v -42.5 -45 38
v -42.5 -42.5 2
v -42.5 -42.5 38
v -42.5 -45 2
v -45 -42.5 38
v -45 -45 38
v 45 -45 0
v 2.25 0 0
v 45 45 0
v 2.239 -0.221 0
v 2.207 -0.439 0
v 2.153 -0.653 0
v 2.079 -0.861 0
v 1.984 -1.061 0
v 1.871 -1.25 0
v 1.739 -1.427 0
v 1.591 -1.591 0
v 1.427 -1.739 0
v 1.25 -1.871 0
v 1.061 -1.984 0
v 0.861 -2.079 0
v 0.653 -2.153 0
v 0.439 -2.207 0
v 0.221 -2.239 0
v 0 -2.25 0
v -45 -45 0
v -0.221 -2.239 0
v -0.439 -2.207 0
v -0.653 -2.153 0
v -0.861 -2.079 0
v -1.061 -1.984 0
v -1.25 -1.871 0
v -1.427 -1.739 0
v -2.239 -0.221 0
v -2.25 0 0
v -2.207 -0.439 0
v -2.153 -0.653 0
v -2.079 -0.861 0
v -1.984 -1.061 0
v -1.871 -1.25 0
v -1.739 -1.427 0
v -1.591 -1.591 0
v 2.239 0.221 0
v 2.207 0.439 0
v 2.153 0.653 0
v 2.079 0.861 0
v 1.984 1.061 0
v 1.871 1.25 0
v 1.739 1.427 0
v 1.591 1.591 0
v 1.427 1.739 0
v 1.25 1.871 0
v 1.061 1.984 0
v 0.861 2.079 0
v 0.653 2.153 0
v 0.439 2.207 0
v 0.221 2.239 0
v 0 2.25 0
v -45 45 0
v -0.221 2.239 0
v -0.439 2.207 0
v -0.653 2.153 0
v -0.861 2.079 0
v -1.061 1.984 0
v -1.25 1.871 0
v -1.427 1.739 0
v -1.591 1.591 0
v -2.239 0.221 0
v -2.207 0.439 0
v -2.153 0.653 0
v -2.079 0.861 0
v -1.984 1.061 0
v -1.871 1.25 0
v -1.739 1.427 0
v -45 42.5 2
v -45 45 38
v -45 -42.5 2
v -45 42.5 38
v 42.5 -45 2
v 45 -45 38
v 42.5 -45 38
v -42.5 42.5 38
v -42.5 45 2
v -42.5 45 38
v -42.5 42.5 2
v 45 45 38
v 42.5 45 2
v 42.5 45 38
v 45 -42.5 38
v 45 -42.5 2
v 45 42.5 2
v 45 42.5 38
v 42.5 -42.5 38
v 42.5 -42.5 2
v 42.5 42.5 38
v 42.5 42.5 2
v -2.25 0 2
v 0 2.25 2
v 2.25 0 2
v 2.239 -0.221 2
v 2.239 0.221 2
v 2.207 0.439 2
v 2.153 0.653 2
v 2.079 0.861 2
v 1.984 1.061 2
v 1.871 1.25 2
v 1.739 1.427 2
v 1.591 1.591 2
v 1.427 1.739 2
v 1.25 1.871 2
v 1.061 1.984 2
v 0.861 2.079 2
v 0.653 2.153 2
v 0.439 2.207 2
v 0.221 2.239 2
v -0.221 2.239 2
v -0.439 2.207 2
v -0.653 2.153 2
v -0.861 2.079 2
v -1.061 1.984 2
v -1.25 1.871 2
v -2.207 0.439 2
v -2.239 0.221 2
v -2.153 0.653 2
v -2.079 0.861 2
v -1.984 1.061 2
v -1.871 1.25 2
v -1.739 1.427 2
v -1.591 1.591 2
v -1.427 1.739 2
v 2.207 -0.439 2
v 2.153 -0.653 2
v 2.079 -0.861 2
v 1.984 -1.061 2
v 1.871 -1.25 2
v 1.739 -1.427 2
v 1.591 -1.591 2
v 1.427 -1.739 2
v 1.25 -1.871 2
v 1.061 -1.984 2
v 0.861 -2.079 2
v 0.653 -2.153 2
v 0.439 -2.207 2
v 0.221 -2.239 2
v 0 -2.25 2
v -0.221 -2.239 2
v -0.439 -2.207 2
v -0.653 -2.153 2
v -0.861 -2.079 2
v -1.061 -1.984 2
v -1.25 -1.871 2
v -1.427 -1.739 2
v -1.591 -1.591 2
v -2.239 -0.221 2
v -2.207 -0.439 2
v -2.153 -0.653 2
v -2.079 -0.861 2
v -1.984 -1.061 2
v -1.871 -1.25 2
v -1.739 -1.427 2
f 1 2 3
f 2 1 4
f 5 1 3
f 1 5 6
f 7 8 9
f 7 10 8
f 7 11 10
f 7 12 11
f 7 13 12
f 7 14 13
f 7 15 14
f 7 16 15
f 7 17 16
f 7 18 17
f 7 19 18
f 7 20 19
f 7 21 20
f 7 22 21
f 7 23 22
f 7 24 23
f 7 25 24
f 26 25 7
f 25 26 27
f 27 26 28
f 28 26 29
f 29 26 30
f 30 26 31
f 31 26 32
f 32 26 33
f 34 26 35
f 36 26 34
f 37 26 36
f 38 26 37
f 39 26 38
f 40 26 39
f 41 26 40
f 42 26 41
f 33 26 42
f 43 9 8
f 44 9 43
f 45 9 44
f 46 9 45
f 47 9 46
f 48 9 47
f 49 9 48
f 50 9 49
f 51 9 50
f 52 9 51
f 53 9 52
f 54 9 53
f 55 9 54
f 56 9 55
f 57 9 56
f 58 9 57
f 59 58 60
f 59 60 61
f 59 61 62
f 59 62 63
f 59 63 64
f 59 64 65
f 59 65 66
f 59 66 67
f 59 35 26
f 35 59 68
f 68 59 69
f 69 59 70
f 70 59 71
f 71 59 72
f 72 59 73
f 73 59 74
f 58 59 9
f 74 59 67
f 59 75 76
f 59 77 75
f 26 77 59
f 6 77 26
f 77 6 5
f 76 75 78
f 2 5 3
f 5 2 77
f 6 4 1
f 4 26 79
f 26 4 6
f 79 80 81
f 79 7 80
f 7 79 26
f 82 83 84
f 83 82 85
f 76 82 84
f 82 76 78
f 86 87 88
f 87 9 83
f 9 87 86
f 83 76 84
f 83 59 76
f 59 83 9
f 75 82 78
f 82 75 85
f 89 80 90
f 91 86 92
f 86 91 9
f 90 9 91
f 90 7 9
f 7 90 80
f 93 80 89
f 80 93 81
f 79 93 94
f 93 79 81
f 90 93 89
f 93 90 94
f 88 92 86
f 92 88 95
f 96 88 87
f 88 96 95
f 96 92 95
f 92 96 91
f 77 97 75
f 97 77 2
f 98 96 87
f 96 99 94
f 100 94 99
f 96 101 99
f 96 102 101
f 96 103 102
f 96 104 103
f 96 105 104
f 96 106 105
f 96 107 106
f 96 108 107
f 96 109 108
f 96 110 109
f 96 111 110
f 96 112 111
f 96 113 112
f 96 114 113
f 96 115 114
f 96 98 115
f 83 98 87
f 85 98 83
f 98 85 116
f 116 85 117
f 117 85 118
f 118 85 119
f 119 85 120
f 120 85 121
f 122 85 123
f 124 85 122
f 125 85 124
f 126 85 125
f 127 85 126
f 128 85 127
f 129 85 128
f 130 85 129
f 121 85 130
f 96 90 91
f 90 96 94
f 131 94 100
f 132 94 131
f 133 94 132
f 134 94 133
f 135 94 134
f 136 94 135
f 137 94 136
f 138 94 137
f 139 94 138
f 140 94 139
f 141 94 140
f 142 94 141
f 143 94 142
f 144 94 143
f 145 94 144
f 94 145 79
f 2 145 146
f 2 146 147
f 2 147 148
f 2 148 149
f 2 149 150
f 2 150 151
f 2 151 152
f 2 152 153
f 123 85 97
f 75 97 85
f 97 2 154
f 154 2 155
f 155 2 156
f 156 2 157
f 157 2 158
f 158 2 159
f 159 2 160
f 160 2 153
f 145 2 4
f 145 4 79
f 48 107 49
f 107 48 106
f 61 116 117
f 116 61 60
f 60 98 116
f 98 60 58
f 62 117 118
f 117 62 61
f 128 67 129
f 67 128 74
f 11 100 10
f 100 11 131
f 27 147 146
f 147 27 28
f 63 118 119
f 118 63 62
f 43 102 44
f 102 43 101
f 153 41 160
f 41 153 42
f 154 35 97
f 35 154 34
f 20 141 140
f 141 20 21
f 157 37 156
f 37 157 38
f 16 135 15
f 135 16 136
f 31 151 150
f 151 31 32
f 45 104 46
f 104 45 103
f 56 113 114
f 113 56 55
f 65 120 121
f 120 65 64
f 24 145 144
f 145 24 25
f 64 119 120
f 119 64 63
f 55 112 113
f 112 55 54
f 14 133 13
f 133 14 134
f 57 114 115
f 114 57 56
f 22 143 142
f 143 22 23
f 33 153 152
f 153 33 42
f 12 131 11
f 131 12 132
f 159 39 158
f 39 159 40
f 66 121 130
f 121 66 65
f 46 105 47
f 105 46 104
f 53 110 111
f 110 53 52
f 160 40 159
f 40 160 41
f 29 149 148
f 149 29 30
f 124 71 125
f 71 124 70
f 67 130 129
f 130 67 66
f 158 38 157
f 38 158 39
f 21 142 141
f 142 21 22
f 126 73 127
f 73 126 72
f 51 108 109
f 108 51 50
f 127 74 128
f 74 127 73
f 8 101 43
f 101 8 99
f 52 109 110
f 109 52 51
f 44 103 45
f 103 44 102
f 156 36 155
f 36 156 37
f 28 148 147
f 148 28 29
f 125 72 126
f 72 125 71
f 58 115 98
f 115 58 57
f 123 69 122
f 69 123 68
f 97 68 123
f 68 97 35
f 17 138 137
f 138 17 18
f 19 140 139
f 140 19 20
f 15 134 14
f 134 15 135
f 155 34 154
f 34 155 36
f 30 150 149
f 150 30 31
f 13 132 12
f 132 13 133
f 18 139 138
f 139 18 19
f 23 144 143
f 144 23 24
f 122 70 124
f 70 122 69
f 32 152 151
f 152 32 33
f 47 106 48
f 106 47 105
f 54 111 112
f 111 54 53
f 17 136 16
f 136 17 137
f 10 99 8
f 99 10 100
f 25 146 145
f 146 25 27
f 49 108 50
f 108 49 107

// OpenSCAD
// DIY magnetic stirrer housing for 80 mm PC case fan
// Print orientation: top plate on bed (z = 0), walls build upward (+Z)
// Note: this is the upside-down open-box mounting position

// ---------- Parameters ----------
outer_size   = 90;    // outer size of top plate and box (X x Y) mm
plate_t      = 2;     // top plate thickness mm (z = 0 to 2)
wall_t       = 2.5;   // wall thickness mm
open_top_z   = 40;    // height of open top edge mm
hole_d       = 4.5;   // M4 screw hole diameter mm
hole_pattern = 71.5;  // square pitch of screw holes mm
notch_w      = 12;    // power cable notch width mm
notch_h      = 8;     // power cable notch depth mm (from open edge)
eps          = 0.5;   // cutter overshoot past faces mm
$fn          = 64;    // curve resolution

// ---------- Model ----------
difference() {
    union() {
        // Top plate
        translate([-outer_size/2, -outer_size/2, 0])
            cube([outer_size, outer_size, plate_t]);

        // Four walls from top plate to open top edge
        for (x = [-outer_size/2, outer_size/2 - wall_t])
            for (y = [-outer_size/2, outer_size/2 - wall_t])
                translate([x, y, 0])
                    cube([wall_t, wall_t, open_top_z - plate_t]);
    }

    // Screw holes through top plate on centred square pattern
    for (i = [0:3]) {
        rotate([0, 0, i < 2 ? 90 : 0])
            translate([0, 0, -eps])
                cylinder(d = hole_d, h = plate_t + 2*eps);
    }

    // Power cable notch in one wall (from z = 32 to open edge at z = 40)
    translate([-outer_size/2 - eps, -notch_w/2, open_top_z - notch_h])
        cube([(outer_size/2 - wall_t) + 2*eps, notch_w, notch_h + eps]);
}
